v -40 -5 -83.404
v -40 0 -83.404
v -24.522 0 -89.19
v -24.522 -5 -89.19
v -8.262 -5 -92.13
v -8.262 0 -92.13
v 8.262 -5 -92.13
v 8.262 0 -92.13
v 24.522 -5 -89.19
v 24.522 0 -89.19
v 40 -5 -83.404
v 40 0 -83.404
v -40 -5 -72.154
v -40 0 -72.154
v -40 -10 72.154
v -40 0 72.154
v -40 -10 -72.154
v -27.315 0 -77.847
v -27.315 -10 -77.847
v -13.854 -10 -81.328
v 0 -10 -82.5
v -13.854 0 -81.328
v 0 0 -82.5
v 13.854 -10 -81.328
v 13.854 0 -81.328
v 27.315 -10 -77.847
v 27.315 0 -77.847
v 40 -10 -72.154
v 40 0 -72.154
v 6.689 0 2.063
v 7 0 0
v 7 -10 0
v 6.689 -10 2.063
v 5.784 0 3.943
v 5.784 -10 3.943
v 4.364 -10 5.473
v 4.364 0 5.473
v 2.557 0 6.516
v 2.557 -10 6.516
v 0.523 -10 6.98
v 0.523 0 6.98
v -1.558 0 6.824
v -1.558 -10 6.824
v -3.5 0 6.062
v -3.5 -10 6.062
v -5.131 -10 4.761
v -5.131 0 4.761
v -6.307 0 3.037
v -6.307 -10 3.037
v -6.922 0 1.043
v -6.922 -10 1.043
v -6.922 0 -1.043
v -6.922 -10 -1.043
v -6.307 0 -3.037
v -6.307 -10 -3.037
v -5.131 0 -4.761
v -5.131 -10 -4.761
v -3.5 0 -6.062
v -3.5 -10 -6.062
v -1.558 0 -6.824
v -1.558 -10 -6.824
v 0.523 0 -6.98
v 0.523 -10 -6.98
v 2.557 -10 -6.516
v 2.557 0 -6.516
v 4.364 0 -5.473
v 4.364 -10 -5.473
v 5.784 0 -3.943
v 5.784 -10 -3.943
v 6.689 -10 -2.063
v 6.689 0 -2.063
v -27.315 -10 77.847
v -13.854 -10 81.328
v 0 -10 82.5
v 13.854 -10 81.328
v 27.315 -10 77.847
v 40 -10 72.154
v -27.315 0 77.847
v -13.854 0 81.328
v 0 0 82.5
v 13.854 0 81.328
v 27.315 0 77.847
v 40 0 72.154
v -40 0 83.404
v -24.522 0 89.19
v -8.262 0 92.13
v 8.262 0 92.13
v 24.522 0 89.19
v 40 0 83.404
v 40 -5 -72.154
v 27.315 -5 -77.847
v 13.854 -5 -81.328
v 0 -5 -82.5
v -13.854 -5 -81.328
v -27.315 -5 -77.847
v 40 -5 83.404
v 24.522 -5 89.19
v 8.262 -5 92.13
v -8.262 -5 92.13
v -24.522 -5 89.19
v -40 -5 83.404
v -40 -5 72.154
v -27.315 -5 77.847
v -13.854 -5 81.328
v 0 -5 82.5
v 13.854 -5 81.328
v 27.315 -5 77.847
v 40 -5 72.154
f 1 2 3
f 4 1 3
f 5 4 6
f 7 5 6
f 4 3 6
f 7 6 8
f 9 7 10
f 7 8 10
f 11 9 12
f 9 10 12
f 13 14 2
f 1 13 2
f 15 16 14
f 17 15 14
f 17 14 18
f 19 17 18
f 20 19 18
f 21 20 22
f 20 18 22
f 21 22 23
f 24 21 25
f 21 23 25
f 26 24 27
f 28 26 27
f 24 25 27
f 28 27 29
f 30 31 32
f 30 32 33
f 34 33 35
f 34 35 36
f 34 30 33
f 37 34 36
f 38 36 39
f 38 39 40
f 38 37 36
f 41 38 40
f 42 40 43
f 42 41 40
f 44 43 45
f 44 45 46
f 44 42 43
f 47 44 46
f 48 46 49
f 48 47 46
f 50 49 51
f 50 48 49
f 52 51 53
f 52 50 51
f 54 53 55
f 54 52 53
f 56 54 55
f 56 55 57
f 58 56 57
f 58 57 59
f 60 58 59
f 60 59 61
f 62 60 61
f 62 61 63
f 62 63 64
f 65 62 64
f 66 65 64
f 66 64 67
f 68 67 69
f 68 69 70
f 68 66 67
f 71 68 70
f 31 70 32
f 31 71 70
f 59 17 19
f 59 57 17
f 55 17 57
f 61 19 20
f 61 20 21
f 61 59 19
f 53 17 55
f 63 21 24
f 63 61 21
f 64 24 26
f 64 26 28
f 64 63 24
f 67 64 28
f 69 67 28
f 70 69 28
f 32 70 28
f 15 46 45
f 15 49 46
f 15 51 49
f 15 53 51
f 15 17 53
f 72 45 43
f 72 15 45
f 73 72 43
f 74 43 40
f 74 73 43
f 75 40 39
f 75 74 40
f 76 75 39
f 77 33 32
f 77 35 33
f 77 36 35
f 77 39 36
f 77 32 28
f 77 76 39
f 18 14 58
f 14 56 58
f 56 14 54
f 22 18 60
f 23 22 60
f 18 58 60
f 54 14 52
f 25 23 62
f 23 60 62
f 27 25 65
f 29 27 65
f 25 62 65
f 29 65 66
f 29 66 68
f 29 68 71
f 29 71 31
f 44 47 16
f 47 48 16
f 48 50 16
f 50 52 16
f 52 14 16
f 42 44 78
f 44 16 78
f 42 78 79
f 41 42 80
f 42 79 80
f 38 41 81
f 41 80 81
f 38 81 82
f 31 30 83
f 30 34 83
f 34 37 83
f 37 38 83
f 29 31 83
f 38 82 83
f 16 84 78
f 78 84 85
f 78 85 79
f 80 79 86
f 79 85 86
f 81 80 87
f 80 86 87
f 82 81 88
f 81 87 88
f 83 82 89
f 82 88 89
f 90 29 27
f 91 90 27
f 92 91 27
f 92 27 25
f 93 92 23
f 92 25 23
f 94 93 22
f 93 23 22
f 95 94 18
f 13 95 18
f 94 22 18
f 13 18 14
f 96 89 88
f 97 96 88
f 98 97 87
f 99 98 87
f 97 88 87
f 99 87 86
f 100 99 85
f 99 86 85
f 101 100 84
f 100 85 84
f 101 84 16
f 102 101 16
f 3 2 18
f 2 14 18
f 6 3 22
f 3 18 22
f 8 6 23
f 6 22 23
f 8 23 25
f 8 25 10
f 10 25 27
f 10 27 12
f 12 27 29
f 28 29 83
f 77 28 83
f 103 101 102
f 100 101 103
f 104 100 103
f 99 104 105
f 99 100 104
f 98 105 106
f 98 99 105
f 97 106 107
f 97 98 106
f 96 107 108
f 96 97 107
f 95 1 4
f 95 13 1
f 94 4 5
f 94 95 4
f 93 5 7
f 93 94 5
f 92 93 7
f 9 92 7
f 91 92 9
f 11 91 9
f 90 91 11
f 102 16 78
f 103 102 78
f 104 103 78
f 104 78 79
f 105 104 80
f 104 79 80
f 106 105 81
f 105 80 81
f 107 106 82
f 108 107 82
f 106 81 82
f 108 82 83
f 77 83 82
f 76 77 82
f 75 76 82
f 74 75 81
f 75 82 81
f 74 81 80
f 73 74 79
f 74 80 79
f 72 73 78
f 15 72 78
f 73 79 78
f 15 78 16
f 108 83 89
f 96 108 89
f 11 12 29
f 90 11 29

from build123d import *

# Parameters (mm, degrees)
F1_DEPTH = 5
F0_R     = 7
F2_DEPTH = 10


with BuildPart() as f1:
    # F0 (on Front) → F1 (new body)
    with BuildSketch(Plane.XZ):
        with BuildLine():
            Line((40, 72.1543484483), (40, 83.4041365881))
            ThreePointArc((40, 83.4041365881), (0, 92.5), (-40, 83.4041365881))
            Line((-40, 83.4041365881), (-40, 72.1543484483))
            ThreePointArc((-40, 72.1543484483), (0, 82.5), (40, 72.1543484483))
        make_face()
    extrude(amount=F1_DEPTH)


with BuildPart() as f1b:
    # F0 (on Front) → F1, piece 2 (new body)
    with BuildSketch(Plane.XZ):
        with BuildLine():
            ThreePointArc((-40, -83.4041365881), (0, -92.5), (40, -83.4041365881))
            Line((40, -83.4041365881), (40, -72.1543484483))
            ThreePointArc((40, -72.1543484483), (0, -82.5), (-40, -72.1543484483))
            Line((-40, -72.1543484483), (-40, -83.4041365881))
        make_face()
    extrude(amount=F1_DEPTH)


with BuildPart() as f2:
    # F0 (on Front) → F2 (new body)
    with BuildSketch(Plane.XZ):
        with BuildLine():
            Line((40, -72.1543484483), (40, 72.1543484483))
            ThreePointArc((40, 72.1543484483), (0, 82.5), (-40, 72.1543484483))
            Line((-40, 72.1543484483), (-40, -72.1543484483))
            ThreePointArc((-40, -72.1543484483), (0, -82.5), (40, -72.1543484483))
        make_face()
        Circle(F0_R, mode=Mode.SUBTRACT)
    extrude(amount=F2_DEPTH)


solid = Compound([f1.part, f1b.part, f2.part])
